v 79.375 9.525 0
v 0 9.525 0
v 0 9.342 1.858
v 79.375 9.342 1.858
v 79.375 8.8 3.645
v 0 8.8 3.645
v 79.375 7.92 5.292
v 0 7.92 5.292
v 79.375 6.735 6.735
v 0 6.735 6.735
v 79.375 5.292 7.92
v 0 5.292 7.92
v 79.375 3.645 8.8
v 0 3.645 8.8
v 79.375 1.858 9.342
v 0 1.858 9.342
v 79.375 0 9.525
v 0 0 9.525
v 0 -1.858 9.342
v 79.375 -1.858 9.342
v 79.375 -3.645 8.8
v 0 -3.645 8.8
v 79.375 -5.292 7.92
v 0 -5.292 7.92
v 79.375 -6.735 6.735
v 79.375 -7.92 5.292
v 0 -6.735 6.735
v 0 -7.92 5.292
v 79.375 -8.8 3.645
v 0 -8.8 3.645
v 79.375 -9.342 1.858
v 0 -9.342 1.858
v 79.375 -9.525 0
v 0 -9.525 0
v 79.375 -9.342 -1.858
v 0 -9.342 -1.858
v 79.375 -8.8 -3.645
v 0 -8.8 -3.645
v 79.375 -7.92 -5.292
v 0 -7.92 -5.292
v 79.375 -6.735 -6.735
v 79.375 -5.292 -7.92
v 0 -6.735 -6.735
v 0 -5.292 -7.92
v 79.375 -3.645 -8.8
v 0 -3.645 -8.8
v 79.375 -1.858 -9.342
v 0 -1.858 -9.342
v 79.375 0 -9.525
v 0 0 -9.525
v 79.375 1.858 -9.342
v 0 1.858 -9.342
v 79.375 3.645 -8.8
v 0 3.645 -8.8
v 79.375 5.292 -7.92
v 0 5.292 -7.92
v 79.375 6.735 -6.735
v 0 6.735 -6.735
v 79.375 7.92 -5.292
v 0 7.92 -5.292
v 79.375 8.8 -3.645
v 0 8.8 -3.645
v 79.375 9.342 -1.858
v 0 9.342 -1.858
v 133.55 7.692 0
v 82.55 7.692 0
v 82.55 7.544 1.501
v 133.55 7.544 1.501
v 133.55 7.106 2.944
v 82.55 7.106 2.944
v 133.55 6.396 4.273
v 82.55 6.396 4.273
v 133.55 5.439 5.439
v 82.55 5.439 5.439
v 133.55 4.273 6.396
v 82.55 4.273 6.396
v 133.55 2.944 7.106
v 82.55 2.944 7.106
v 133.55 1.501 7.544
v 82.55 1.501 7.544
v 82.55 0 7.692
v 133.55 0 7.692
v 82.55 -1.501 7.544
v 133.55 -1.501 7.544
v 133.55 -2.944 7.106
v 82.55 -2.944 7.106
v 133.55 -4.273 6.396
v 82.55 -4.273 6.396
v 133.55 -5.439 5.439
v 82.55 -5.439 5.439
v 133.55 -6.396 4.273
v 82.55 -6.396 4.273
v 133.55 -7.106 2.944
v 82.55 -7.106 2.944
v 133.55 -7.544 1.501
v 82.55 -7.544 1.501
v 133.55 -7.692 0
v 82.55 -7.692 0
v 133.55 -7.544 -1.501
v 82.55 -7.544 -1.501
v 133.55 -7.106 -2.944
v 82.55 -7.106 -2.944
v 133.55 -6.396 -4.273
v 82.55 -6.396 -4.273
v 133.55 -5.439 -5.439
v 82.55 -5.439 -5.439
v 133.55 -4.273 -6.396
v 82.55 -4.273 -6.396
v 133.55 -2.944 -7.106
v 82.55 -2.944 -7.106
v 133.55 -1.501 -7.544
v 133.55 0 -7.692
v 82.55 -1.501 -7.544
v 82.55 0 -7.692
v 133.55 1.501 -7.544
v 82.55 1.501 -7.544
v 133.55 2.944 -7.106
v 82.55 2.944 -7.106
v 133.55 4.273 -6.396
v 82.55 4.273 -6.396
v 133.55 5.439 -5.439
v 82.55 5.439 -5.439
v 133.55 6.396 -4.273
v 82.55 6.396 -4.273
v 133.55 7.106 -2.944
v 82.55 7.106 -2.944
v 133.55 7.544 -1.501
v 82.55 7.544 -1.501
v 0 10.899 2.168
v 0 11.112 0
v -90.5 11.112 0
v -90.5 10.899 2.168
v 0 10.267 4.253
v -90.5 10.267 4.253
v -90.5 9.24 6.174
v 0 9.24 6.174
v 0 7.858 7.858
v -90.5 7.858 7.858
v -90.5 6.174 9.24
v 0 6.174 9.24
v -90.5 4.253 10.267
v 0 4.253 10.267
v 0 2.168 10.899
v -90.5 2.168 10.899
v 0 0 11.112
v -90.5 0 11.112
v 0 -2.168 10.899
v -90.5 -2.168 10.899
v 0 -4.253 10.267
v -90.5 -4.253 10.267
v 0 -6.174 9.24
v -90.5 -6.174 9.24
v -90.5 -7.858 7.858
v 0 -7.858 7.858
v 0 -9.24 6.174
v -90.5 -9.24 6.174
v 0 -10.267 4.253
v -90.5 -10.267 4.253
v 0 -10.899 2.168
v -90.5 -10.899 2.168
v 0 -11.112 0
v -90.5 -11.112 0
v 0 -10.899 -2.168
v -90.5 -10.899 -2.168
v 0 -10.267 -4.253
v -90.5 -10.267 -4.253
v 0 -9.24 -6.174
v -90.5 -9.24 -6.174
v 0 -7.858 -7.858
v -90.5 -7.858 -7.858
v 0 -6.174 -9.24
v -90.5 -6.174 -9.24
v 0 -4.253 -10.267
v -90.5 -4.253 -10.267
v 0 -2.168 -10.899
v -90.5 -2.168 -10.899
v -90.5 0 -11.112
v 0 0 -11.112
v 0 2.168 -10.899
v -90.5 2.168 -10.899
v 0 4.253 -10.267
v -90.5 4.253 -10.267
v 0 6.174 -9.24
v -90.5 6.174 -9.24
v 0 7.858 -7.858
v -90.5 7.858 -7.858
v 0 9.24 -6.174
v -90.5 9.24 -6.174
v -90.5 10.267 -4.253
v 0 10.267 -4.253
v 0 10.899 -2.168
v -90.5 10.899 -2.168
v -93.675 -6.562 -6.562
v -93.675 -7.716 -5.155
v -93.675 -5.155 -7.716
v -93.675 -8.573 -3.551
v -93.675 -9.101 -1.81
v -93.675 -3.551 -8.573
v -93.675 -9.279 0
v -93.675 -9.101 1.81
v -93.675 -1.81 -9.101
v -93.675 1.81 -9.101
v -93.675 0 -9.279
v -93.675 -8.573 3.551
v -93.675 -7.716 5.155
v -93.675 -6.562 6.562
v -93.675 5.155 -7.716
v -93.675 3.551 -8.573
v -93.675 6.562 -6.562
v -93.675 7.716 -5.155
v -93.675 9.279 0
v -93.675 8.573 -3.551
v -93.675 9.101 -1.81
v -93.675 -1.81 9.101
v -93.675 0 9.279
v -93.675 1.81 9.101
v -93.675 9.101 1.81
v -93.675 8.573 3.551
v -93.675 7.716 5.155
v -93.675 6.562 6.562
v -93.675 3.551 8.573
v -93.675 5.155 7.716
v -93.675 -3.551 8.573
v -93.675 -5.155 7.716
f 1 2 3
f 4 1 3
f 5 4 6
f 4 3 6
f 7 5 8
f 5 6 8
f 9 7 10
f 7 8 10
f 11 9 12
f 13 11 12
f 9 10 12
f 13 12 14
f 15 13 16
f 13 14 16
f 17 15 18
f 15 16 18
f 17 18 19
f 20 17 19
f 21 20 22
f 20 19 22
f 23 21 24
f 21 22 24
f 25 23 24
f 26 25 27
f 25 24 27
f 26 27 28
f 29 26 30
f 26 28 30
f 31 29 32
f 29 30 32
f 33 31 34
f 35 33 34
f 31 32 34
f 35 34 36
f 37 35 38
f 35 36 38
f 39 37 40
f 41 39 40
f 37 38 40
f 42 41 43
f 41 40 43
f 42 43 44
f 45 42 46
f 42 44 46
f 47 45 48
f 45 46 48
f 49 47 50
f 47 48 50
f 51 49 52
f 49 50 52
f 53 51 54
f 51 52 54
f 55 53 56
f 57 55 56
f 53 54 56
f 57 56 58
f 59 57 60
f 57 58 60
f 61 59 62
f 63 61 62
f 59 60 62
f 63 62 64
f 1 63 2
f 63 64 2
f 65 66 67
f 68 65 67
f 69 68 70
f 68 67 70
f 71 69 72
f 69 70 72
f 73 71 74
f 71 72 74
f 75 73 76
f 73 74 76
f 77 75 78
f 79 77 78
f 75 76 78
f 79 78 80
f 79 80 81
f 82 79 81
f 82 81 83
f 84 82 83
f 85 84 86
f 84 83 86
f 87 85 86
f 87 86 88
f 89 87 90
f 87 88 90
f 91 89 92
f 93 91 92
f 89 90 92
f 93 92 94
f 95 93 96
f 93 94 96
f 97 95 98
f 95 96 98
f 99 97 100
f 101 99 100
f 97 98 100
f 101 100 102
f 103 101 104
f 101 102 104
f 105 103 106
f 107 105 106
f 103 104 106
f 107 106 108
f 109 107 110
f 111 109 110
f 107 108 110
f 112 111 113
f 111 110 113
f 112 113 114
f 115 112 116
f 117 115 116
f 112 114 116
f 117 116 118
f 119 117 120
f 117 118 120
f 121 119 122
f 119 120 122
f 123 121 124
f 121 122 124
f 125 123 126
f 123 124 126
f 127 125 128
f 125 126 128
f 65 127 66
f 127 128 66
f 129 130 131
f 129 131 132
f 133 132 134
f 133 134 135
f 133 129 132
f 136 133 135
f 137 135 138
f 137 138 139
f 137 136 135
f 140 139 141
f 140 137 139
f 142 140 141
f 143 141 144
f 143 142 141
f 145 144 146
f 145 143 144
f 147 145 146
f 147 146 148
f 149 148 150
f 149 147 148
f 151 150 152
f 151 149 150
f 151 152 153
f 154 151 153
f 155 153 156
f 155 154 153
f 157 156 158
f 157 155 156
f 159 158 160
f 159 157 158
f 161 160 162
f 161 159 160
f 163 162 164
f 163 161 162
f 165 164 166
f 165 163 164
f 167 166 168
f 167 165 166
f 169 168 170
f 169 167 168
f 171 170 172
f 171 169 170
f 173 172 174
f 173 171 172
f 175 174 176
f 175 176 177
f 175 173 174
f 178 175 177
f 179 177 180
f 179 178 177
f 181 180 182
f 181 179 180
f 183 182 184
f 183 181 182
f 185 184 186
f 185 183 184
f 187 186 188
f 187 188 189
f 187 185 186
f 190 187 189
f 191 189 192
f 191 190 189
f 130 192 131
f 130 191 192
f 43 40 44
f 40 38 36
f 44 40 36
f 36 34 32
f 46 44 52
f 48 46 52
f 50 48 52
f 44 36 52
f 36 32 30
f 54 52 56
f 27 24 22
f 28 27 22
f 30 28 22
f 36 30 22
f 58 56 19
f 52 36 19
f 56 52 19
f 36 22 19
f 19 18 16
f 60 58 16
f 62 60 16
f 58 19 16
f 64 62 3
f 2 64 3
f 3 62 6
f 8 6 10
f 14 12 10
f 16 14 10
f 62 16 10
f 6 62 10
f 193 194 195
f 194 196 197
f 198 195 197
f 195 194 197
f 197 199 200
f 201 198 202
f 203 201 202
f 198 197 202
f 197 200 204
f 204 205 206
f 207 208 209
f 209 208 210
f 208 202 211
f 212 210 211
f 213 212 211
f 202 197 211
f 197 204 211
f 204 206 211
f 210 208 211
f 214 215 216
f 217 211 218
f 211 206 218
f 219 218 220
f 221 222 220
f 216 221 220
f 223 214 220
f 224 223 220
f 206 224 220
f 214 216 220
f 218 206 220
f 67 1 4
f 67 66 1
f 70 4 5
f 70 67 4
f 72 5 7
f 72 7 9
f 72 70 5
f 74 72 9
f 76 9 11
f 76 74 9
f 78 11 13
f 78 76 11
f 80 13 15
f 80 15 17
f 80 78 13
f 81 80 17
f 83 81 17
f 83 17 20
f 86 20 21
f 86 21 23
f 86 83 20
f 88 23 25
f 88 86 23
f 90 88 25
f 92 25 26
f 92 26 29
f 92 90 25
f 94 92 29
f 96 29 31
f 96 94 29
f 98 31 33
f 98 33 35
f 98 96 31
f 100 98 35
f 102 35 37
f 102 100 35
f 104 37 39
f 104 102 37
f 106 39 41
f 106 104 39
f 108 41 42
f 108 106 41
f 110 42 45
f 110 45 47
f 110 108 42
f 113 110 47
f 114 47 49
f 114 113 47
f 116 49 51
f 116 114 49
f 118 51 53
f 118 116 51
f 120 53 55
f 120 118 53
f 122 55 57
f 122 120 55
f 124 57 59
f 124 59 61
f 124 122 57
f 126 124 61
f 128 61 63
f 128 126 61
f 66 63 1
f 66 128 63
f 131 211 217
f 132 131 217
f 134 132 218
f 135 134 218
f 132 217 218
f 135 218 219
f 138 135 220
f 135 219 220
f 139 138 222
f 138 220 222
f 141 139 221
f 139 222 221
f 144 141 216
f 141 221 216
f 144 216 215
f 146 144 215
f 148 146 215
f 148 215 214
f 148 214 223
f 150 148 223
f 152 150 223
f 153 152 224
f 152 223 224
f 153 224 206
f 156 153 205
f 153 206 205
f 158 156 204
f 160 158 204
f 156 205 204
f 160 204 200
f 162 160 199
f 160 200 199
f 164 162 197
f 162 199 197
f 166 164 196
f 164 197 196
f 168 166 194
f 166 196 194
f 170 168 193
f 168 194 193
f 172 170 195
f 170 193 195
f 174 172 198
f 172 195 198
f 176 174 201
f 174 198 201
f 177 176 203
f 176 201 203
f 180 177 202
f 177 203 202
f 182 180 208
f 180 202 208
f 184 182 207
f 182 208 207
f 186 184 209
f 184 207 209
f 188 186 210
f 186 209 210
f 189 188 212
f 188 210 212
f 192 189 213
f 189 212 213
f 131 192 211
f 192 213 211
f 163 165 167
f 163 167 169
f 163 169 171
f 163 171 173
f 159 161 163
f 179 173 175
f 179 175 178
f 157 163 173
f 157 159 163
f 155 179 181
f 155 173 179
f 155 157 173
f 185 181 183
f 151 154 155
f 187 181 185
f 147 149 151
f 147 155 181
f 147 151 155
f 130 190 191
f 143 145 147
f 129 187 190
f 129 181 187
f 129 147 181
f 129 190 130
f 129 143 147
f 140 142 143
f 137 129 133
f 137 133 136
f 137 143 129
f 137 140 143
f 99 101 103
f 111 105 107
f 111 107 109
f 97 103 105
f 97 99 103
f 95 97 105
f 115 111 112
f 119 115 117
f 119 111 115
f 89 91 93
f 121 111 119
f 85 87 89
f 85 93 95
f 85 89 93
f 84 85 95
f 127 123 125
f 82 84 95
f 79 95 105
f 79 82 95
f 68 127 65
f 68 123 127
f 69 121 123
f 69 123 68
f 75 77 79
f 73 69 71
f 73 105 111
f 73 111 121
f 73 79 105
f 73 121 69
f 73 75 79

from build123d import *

# Parameters (mm, degrees)
F0_R      = 11.1125
F0_R_2    = 9.525
F1_DEPTH  = 93.6752
F2_DEPTH  = 82.55
F3_SIZE2  = 1.833087
F3_SIZE   = 3.175
F4_SIZE2  = 1.833087
F4_SIZE   = 3.175
F2_FACE_R = 7.691913
F5_DEPTH  = 51


with BuildPart() as f1:
    # F0 (on Right) → F1 (new body)
    with BuildSketch(Plane.YZ):
        Circle(F0_R)
        Circle(F0_R_2, mode=Mode.SUBTRACT)
        Circle(F0_R_2)
    extrude(amount=-F1_DEPTH)

    # F3
    f3_edges = [f1.edges().sort_by_distance(p)[0] for p in [
        (-93.6752, -11.1125, 0),
    ]]
    chamfer(f3_edges, length=F3_SIZE, length2=F3_SIZE2)


with BuildPart() as f2:
    # F0 (on Right) → F2 (new body)
    with BuildSketch(Plane.YZ):
        Circle(F0_R_2)
    extrude(amount=F2_DEPTH)

    # F4
    f4_edges = [f2.edges().sort_by_distance(p)[0] for p in [
        (82.55, -9.525, 0),
    ]]
    chamfer(f4_edges, length=F4_SIZE, length2=F4_SIZE2)

    # F2_face (on face) → F5 (join)
    with BuildSketch(Plane.YZ.offset(82.55)):
        Circle(F2_FACE_R)
    extrude(amount=F5_DEPTH)


solid = Compound([f1.part, f2.part])
